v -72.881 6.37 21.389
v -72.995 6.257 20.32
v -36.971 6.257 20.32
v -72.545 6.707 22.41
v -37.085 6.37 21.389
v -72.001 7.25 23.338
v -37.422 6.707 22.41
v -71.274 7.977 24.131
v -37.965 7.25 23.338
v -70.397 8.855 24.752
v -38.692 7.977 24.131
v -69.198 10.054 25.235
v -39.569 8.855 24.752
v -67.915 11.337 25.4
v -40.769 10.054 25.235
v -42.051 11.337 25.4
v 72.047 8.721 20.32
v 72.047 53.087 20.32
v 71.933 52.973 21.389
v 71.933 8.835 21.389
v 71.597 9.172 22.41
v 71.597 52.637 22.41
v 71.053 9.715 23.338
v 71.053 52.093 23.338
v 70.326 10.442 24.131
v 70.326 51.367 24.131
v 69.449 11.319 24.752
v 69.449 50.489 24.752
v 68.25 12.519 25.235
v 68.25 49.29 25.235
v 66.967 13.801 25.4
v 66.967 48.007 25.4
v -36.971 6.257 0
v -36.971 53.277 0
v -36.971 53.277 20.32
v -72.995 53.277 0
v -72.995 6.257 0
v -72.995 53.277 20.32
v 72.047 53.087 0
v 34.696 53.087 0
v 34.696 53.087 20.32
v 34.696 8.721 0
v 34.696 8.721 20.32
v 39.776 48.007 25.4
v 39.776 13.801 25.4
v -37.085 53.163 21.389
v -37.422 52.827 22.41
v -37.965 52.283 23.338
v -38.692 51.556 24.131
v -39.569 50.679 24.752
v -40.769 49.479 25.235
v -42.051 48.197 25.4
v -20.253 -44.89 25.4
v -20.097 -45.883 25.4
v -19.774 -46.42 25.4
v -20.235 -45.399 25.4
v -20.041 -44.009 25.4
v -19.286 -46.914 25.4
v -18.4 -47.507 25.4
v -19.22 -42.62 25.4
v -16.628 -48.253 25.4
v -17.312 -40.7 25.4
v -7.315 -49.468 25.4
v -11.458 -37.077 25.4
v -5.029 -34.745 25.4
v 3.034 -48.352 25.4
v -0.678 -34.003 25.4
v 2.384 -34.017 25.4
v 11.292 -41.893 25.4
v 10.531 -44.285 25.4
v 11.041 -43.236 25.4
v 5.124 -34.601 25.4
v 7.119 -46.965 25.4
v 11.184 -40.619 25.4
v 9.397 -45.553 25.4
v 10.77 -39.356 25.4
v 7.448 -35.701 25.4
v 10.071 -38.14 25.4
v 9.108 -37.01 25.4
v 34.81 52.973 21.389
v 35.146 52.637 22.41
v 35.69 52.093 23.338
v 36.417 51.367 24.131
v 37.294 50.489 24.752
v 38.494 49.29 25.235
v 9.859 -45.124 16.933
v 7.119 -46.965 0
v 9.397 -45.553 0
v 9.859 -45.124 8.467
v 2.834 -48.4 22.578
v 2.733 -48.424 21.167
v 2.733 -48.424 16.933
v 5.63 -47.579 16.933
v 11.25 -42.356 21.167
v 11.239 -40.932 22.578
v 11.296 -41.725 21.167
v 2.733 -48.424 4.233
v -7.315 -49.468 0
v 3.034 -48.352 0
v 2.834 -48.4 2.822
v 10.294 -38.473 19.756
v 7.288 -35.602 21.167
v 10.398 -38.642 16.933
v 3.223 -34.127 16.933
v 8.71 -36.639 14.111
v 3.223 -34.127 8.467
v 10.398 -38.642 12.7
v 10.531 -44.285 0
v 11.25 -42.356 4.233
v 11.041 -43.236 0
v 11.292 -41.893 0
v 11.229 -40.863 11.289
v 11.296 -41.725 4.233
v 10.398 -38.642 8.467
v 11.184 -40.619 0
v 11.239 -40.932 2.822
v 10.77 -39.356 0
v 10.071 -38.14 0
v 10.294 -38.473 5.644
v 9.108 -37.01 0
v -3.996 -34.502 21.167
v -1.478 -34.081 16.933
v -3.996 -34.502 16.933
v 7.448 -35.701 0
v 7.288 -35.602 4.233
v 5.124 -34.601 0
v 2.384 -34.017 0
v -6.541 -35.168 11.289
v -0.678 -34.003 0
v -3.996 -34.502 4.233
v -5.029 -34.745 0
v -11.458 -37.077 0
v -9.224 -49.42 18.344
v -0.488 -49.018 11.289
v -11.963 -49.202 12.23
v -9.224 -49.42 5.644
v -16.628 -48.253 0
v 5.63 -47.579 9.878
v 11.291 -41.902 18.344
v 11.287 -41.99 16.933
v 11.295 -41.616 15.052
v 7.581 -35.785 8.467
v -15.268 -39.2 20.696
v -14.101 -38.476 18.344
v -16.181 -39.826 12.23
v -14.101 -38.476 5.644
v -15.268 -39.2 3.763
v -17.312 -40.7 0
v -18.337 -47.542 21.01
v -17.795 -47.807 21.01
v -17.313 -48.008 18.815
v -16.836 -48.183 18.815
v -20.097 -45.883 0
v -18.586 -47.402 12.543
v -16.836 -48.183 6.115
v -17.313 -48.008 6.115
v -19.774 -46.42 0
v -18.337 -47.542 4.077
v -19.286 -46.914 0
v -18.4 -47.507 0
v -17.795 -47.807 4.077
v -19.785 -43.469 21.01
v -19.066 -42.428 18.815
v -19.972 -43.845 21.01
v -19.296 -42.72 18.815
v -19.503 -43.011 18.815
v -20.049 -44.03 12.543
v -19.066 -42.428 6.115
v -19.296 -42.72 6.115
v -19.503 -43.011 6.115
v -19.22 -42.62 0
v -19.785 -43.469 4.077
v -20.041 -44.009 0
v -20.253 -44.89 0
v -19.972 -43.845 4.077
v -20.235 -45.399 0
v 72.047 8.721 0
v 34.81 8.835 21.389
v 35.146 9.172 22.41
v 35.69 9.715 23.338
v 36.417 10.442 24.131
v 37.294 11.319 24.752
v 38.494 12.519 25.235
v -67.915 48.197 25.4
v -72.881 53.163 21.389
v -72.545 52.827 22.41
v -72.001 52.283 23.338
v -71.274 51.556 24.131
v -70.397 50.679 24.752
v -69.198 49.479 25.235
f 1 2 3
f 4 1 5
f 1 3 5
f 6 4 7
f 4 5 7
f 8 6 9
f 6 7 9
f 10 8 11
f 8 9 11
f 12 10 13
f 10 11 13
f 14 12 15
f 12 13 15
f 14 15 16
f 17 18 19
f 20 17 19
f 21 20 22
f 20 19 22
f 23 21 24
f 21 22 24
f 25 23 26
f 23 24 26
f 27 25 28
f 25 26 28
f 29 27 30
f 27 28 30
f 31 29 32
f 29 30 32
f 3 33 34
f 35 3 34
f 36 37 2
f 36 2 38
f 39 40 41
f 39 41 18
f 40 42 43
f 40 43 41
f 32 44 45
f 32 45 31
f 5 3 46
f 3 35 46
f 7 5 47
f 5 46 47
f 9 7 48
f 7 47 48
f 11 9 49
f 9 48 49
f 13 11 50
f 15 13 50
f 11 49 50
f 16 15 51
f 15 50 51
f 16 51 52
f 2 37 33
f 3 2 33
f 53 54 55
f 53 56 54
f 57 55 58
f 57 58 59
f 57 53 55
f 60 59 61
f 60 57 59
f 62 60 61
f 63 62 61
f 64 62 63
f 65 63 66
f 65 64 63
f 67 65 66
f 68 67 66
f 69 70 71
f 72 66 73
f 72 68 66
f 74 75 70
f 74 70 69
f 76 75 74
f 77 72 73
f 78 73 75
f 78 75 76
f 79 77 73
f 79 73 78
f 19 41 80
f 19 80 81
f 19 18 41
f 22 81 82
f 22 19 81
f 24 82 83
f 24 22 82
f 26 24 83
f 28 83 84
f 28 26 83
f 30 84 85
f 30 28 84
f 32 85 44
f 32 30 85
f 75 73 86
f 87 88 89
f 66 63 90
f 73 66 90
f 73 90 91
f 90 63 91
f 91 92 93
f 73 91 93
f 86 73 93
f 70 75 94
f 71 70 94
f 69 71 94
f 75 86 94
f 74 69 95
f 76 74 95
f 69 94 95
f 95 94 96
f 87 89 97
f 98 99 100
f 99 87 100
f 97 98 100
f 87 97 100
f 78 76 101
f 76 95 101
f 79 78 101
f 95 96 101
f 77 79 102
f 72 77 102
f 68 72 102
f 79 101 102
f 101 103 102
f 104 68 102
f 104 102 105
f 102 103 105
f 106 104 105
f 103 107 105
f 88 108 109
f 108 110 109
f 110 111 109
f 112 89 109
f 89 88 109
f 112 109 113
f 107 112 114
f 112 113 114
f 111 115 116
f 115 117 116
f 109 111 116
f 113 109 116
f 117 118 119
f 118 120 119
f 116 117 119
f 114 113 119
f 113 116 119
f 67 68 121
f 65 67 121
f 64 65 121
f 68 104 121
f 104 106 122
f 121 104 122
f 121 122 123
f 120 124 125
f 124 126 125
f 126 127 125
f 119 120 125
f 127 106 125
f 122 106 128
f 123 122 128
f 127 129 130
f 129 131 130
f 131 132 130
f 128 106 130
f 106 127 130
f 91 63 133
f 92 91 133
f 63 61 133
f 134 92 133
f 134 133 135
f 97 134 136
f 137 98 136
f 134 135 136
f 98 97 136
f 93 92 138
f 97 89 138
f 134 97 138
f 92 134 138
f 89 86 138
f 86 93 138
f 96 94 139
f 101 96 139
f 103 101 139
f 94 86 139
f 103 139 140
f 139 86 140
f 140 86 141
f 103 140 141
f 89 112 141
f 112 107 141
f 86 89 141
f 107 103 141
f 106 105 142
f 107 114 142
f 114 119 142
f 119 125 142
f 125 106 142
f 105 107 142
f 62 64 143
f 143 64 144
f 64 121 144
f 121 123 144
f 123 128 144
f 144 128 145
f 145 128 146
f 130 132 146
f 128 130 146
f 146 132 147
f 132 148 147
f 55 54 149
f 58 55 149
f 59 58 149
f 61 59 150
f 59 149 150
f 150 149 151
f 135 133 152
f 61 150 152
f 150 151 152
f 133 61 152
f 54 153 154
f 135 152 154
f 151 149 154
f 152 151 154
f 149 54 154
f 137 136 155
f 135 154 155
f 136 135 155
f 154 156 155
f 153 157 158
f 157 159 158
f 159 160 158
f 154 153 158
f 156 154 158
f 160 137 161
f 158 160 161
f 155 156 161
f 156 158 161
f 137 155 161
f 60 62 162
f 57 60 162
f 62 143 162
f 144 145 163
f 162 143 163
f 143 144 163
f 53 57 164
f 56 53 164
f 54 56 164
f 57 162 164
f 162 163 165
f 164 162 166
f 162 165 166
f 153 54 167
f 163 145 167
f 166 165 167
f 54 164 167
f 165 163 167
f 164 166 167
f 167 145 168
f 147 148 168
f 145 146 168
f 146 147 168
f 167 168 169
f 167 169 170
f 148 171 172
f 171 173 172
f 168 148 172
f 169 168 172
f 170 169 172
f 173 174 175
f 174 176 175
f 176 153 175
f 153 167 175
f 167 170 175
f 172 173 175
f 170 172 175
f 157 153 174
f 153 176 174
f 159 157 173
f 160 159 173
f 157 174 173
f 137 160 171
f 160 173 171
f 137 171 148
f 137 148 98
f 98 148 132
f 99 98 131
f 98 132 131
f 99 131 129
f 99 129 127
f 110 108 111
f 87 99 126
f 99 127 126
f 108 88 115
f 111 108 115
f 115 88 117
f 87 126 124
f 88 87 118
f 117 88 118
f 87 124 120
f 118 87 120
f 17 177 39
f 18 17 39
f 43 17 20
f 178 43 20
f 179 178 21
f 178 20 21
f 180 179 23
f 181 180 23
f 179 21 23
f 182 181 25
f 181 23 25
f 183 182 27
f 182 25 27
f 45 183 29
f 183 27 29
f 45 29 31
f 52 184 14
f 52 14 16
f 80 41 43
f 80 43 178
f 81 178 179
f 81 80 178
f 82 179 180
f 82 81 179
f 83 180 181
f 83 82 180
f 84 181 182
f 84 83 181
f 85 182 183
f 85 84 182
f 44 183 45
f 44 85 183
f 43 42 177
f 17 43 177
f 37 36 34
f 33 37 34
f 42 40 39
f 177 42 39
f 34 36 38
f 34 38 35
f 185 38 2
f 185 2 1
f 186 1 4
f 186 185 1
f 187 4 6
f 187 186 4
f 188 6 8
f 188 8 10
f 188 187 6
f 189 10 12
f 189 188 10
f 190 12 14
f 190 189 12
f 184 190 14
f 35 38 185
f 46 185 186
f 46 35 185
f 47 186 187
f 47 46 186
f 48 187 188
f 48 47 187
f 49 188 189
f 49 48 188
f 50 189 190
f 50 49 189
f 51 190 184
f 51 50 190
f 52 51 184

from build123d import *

# Parameters (mm, degrees)
F0_W     = 36.0234566033
F0_H     = 47.0200972632
F1_DEPTH = 25.4
F0_W_2   = 37.3506397009
F0_H_2   = 44.3657357246
F2_R     = 5.08
F3_R     = 5.08


with BuildPart() as f1:
    # F0 (on Top) → F1 (new body)
    with BuildSketch(Plane.XY):
        with Locations((-54.9831744283, 29.7667547129)):
            Rectangle(F0_W, F0_H)
    extrude(amount=F1_DEPTH)

    # F2
    f2_edges = [f1.edges().sort_by_distance(p)[0] for p in [
        (-54.983174, 53.276803, 25.4),
        (-72.994903, 29.766755, 25.4),
        (-54.983174, 6.256706, 25.4),
        (-36.971446, 29.766755, 25.4),
    ]]
    fillet(f2_edges, radius=F2_R)


with BuildPart() as f1b:
    # F0 (on Top) → F1, piece 2 (new body)
    with BuildSketch(Plane.XY):
        with Locations((53.3716008067, 30.9043368325)):
            Rectangle(F0_W_2, F0_H_2)
    extrude(amount=F1_DEPTH)

    # F3
    f3_edges = [f1b.edges().sort_by_distance(p)[0] for p in [
        (53.371601, 53.087205, 25.4),
        (72.046921, 30.904337, 25.4),
        (53.371601, 8.721469, 25.4),
        (34.696281, 30.904337, 25.4),
    ]]
    fillet(f3_edges, radius=F3_R)


with BuildPart() as f1c:
    # F0 (on Top) → F1, piece 3 (new body)
    with BuildSketch(Plane.XY):
        with BuildLine():
            add(Edge.make_bspline(
                [(-20.0972985476, -45.8825156093), (-18.0280519392, -50.761255776), (18.9660756998, -50.8391629105), (4.7652291289, -26.4155916283), (-22.0290362866, -41.32798525), (-20.0972985476, -45.8825156093)],
                knots=[0, 0, 0, 0, 0.3863644362, 0.6393108684, 1, 1, 1, 1], degree=3))
        make_face()
    extrude(amount=F1_DEPTH)


solid = Compound([f1.part, f1b.part, f1c.part])
